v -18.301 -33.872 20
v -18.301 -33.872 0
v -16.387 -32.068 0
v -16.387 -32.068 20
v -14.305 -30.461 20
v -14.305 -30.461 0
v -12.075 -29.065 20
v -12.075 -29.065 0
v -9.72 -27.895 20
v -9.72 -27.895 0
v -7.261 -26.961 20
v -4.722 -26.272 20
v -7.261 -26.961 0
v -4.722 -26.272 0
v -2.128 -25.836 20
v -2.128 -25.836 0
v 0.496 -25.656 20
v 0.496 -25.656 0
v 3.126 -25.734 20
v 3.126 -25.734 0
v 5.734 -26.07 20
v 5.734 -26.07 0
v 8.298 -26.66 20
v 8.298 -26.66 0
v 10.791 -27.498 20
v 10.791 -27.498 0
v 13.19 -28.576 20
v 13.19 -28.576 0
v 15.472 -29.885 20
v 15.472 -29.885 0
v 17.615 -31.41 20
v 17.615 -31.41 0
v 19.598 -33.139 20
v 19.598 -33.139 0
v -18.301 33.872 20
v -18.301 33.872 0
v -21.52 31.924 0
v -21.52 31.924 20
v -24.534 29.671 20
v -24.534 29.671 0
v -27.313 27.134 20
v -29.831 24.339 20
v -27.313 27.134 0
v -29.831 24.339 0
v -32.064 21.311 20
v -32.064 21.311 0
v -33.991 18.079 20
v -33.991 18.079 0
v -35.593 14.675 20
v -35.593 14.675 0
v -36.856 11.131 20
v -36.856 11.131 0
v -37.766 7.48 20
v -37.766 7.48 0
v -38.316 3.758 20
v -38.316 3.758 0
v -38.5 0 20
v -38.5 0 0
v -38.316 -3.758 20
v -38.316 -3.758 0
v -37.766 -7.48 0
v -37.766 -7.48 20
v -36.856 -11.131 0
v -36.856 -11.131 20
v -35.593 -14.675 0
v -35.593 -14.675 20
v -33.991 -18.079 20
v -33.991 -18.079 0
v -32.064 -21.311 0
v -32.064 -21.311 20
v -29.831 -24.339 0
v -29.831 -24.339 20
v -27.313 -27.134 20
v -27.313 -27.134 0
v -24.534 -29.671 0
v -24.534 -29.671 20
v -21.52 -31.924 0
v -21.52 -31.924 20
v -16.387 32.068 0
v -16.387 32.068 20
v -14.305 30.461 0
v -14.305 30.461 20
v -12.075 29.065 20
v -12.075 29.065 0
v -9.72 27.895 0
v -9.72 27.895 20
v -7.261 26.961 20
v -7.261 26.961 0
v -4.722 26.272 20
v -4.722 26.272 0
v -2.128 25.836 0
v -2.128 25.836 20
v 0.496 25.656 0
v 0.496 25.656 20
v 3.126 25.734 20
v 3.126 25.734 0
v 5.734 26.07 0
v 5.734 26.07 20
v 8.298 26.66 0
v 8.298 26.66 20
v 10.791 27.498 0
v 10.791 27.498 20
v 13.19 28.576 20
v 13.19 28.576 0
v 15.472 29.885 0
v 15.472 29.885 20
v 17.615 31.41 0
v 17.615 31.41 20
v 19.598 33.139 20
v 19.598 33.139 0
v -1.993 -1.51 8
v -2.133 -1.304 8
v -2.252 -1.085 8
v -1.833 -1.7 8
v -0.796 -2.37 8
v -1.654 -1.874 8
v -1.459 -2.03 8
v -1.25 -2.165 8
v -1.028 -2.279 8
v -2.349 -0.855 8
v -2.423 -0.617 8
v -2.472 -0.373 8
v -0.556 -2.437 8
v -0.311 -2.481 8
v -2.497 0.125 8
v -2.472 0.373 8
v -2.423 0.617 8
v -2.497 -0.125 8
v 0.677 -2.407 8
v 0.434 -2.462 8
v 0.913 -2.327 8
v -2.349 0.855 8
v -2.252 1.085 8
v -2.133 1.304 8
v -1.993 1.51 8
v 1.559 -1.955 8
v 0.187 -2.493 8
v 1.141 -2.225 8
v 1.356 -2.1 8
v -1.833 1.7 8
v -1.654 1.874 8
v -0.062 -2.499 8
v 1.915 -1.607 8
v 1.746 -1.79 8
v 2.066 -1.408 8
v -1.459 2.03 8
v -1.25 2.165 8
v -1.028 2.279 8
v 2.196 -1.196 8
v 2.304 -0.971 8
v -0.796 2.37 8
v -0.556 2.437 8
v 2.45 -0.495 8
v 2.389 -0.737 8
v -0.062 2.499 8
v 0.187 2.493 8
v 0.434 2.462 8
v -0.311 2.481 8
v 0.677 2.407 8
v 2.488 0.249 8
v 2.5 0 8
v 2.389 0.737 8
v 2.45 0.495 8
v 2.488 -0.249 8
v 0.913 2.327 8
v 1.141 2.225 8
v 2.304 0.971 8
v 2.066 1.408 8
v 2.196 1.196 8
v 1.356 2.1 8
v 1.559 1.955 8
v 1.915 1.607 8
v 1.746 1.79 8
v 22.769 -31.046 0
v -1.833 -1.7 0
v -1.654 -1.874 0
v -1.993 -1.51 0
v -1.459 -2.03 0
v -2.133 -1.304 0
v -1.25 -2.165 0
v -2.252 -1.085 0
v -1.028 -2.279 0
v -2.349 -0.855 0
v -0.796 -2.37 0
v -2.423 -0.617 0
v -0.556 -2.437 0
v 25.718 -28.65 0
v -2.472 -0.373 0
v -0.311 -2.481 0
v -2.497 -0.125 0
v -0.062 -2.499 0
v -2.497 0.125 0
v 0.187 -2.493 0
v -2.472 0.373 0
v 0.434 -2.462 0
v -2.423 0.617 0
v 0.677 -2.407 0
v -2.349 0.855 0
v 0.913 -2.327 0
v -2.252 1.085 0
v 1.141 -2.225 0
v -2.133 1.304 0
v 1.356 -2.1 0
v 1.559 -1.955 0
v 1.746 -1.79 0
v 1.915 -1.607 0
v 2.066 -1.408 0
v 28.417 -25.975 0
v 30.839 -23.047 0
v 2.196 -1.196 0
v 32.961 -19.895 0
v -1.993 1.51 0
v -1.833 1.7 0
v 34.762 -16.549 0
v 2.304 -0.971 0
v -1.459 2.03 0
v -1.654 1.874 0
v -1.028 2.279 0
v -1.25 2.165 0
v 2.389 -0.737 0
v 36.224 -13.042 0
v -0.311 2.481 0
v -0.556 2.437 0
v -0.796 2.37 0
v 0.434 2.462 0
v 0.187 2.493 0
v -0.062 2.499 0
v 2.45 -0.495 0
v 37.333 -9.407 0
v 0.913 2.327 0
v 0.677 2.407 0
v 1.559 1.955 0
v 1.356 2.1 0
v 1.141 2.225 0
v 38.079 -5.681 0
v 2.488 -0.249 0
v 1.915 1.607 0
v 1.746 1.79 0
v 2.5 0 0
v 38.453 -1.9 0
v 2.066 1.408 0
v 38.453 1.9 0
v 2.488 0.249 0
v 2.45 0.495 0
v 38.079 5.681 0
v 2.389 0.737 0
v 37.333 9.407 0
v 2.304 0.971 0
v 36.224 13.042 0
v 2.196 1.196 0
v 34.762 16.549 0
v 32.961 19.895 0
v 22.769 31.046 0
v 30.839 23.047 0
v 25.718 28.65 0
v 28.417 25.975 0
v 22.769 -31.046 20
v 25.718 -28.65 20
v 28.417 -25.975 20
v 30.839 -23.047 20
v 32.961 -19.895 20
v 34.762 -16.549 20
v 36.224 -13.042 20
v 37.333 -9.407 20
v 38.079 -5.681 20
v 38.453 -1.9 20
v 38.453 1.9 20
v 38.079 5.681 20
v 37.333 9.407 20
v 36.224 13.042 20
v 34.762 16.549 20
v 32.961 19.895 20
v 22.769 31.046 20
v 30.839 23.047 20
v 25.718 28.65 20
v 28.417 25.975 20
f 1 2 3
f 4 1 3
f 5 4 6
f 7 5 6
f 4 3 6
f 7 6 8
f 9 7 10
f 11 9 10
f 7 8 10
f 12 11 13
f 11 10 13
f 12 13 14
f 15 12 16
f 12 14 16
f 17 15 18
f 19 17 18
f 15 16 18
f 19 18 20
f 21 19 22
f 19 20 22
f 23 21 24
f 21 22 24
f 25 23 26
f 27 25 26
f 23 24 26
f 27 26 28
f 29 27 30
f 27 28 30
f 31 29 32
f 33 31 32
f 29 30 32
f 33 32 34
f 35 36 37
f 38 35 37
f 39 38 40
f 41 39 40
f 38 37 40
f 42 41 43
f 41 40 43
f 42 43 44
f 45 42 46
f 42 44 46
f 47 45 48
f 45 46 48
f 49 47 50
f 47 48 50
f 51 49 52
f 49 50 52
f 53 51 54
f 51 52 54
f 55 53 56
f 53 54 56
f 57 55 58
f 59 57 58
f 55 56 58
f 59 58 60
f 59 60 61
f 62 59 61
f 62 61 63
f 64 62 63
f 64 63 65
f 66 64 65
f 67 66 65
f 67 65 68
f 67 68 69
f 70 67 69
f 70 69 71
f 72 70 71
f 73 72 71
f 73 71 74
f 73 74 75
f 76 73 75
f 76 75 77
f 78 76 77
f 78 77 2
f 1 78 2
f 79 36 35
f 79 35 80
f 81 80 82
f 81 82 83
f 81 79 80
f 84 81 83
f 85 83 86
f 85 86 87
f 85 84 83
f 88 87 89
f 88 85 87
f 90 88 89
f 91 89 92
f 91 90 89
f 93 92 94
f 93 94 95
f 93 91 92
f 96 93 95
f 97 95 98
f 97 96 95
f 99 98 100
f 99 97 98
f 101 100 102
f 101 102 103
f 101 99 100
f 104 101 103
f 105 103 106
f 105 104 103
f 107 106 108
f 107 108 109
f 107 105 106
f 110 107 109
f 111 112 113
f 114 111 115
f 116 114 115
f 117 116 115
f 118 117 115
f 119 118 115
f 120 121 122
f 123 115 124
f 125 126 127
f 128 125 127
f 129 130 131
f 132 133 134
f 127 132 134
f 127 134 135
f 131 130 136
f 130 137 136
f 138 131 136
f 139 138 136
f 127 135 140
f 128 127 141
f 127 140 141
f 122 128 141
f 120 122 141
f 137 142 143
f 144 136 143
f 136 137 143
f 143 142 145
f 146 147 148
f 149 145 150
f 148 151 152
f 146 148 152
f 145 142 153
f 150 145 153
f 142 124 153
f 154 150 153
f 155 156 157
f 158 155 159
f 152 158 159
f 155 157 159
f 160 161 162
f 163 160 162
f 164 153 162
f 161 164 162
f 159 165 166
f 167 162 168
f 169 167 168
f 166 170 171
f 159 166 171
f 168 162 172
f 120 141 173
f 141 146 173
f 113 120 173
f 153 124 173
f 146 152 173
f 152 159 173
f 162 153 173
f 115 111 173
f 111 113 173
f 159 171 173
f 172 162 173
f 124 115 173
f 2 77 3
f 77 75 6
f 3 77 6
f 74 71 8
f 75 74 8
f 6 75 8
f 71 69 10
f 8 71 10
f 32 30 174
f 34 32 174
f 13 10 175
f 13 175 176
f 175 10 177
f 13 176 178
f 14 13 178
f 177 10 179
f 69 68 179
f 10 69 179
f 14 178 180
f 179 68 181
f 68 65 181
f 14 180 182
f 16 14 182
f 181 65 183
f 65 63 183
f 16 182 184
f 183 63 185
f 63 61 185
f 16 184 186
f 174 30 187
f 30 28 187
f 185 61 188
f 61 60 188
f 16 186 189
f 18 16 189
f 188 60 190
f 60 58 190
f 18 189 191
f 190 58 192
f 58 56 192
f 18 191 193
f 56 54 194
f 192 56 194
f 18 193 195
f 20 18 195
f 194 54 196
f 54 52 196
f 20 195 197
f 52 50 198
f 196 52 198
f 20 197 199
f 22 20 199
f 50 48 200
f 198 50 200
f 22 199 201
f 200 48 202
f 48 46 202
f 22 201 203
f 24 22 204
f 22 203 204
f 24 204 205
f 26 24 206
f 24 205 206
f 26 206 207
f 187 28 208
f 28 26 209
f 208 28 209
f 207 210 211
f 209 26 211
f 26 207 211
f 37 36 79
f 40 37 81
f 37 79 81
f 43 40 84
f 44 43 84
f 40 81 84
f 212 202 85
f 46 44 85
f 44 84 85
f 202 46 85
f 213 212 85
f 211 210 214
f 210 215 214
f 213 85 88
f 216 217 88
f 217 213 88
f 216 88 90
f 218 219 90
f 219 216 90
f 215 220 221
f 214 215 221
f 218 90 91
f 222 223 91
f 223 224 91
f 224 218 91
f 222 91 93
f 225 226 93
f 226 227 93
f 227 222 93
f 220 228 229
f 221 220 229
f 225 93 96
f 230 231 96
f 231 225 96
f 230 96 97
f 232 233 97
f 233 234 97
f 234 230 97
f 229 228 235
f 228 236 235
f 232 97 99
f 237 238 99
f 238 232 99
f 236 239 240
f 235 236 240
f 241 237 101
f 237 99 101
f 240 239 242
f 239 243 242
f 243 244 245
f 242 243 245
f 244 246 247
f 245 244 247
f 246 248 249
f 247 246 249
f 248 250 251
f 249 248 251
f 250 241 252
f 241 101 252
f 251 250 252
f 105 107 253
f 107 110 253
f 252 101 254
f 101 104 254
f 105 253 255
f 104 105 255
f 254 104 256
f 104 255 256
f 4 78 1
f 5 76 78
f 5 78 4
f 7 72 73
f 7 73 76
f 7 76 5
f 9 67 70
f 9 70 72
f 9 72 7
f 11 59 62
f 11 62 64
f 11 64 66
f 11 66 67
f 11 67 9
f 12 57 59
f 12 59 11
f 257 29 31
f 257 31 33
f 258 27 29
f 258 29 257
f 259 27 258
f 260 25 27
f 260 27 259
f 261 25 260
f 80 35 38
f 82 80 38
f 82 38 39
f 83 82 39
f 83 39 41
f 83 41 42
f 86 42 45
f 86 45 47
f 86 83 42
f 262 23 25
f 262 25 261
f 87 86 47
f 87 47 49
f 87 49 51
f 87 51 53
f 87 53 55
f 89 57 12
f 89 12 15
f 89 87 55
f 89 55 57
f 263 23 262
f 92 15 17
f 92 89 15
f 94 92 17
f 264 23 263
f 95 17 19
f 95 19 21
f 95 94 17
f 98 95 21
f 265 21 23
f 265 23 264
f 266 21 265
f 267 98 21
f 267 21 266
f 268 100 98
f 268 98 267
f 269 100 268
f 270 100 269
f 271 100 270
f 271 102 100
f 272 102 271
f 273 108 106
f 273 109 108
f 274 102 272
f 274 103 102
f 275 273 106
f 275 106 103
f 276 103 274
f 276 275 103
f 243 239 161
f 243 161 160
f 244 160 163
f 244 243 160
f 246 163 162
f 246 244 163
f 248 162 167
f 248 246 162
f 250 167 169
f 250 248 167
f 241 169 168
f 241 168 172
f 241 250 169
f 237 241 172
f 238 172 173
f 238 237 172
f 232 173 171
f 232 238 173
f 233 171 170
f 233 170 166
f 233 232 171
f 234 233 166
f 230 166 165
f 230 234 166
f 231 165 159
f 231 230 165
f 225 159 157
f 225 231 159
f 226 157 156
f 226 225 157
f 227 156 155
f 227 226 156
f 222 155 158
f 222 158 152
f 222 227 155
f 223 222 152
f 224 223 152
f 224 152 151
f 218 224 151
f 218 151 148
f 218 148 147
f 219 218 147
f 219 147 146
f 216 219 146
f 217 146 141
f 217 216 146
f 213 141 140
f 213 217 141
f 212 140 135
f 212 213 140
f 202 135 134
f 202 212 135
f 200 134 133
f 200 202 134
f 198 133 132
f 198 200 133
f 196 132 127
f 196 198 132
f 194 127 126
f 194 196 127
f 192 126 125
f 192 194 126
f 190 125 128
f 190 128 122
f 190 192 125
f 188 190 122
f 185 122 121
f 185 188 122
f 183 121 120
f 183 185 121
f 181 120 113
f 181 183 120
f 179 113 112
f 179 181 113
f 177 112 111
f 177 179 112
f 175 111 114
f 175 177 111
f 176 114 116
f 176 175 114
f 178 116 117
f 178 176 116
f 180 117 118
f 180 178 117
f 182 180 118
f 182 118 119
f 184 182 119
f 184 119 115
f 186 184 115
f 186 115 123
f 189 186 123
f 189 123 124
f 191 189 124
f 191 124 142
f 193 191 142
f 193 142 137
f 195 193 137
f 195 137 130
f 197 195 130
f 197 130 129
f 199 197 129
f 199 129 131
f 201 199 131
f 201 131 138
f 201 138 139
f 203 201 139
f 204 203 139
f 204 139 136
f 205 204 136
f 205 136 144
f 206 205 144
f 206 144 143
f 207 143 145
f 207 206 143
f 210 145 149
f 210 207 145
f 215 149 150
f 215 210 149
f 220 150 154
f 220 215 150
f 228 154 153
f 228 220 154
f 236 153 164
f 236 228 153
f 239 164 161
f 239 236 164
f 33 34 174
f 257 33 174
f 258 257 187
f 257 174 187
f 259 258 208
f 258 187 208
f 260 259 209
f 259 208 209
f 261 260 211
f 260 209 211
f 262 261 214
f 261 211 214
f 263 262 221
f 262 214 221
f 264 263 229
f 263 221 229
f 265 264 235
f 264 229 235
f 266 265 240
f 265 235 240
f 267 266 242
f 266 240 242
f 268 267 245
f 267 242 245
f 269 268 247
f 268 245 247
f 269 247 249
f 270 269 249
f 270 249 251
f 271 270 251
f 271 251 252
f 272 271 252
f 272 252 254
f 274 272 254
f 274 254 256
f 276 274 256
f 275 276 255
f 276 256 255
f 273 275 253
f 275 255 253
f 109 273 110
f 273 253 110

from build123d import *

# Parameters (mm, degrees)
SKETCH_1_R          = 38.5
EXTRUDE_2_DEPTH     = 20
CUT_EXTRUDE_1_DEPTH = 20
SKETCH_4_R          = 2.5
CUT_EXTRUDE_2_DEPTH = 8


with BuildPart() as part:
    # Эскиз1 → Бобышка-Вытянуть2 (new body)
    with BuildSketch(Plane.XY):
        Circle(SKETCH_1_R)
    extrude(amount=EXTRUDE_2_DEPTH)

    # Эскиз3 → Вырез-Вытянуть1 (cut)
    with BuildSketch(Plane.XY):
        with BuildLine():
            ThreePointArc((-18.301346902, 33.871975165), (0.496314005, 25.656261649), (19.597654242, 33.138828407))
            ThreePointArc((19.597654242, 33.138828407), (0.744633616, 38.492798298), (-18.301346902, 33.871975165))
        make_face()
        with BuildLine():
            ThreePointArc((-18.301346902, -33.871975165), (0.496314005, -25.656261649), (19.597654242, -33.138828407))
            ThreePointArc((19.597654242, -33.138828407), (0.744633616, -38.492798298), (-18.301346902, -33.871975165))
        make_face()
    extrude(amount=CUT_EXTRUDE_1_DEPTH, mode=Mode.SUBTRACT)

    # Эскиз4 → Вырез-Вытянуть2 (cut)
    with BuildSketch(Plane.XY):
        Circle(SKETCH_4_R)
    extrude(amount=CUT_EXTRUDE_2_DEPTH, mode=Mode.SUBTRACT)


solid = part.part
